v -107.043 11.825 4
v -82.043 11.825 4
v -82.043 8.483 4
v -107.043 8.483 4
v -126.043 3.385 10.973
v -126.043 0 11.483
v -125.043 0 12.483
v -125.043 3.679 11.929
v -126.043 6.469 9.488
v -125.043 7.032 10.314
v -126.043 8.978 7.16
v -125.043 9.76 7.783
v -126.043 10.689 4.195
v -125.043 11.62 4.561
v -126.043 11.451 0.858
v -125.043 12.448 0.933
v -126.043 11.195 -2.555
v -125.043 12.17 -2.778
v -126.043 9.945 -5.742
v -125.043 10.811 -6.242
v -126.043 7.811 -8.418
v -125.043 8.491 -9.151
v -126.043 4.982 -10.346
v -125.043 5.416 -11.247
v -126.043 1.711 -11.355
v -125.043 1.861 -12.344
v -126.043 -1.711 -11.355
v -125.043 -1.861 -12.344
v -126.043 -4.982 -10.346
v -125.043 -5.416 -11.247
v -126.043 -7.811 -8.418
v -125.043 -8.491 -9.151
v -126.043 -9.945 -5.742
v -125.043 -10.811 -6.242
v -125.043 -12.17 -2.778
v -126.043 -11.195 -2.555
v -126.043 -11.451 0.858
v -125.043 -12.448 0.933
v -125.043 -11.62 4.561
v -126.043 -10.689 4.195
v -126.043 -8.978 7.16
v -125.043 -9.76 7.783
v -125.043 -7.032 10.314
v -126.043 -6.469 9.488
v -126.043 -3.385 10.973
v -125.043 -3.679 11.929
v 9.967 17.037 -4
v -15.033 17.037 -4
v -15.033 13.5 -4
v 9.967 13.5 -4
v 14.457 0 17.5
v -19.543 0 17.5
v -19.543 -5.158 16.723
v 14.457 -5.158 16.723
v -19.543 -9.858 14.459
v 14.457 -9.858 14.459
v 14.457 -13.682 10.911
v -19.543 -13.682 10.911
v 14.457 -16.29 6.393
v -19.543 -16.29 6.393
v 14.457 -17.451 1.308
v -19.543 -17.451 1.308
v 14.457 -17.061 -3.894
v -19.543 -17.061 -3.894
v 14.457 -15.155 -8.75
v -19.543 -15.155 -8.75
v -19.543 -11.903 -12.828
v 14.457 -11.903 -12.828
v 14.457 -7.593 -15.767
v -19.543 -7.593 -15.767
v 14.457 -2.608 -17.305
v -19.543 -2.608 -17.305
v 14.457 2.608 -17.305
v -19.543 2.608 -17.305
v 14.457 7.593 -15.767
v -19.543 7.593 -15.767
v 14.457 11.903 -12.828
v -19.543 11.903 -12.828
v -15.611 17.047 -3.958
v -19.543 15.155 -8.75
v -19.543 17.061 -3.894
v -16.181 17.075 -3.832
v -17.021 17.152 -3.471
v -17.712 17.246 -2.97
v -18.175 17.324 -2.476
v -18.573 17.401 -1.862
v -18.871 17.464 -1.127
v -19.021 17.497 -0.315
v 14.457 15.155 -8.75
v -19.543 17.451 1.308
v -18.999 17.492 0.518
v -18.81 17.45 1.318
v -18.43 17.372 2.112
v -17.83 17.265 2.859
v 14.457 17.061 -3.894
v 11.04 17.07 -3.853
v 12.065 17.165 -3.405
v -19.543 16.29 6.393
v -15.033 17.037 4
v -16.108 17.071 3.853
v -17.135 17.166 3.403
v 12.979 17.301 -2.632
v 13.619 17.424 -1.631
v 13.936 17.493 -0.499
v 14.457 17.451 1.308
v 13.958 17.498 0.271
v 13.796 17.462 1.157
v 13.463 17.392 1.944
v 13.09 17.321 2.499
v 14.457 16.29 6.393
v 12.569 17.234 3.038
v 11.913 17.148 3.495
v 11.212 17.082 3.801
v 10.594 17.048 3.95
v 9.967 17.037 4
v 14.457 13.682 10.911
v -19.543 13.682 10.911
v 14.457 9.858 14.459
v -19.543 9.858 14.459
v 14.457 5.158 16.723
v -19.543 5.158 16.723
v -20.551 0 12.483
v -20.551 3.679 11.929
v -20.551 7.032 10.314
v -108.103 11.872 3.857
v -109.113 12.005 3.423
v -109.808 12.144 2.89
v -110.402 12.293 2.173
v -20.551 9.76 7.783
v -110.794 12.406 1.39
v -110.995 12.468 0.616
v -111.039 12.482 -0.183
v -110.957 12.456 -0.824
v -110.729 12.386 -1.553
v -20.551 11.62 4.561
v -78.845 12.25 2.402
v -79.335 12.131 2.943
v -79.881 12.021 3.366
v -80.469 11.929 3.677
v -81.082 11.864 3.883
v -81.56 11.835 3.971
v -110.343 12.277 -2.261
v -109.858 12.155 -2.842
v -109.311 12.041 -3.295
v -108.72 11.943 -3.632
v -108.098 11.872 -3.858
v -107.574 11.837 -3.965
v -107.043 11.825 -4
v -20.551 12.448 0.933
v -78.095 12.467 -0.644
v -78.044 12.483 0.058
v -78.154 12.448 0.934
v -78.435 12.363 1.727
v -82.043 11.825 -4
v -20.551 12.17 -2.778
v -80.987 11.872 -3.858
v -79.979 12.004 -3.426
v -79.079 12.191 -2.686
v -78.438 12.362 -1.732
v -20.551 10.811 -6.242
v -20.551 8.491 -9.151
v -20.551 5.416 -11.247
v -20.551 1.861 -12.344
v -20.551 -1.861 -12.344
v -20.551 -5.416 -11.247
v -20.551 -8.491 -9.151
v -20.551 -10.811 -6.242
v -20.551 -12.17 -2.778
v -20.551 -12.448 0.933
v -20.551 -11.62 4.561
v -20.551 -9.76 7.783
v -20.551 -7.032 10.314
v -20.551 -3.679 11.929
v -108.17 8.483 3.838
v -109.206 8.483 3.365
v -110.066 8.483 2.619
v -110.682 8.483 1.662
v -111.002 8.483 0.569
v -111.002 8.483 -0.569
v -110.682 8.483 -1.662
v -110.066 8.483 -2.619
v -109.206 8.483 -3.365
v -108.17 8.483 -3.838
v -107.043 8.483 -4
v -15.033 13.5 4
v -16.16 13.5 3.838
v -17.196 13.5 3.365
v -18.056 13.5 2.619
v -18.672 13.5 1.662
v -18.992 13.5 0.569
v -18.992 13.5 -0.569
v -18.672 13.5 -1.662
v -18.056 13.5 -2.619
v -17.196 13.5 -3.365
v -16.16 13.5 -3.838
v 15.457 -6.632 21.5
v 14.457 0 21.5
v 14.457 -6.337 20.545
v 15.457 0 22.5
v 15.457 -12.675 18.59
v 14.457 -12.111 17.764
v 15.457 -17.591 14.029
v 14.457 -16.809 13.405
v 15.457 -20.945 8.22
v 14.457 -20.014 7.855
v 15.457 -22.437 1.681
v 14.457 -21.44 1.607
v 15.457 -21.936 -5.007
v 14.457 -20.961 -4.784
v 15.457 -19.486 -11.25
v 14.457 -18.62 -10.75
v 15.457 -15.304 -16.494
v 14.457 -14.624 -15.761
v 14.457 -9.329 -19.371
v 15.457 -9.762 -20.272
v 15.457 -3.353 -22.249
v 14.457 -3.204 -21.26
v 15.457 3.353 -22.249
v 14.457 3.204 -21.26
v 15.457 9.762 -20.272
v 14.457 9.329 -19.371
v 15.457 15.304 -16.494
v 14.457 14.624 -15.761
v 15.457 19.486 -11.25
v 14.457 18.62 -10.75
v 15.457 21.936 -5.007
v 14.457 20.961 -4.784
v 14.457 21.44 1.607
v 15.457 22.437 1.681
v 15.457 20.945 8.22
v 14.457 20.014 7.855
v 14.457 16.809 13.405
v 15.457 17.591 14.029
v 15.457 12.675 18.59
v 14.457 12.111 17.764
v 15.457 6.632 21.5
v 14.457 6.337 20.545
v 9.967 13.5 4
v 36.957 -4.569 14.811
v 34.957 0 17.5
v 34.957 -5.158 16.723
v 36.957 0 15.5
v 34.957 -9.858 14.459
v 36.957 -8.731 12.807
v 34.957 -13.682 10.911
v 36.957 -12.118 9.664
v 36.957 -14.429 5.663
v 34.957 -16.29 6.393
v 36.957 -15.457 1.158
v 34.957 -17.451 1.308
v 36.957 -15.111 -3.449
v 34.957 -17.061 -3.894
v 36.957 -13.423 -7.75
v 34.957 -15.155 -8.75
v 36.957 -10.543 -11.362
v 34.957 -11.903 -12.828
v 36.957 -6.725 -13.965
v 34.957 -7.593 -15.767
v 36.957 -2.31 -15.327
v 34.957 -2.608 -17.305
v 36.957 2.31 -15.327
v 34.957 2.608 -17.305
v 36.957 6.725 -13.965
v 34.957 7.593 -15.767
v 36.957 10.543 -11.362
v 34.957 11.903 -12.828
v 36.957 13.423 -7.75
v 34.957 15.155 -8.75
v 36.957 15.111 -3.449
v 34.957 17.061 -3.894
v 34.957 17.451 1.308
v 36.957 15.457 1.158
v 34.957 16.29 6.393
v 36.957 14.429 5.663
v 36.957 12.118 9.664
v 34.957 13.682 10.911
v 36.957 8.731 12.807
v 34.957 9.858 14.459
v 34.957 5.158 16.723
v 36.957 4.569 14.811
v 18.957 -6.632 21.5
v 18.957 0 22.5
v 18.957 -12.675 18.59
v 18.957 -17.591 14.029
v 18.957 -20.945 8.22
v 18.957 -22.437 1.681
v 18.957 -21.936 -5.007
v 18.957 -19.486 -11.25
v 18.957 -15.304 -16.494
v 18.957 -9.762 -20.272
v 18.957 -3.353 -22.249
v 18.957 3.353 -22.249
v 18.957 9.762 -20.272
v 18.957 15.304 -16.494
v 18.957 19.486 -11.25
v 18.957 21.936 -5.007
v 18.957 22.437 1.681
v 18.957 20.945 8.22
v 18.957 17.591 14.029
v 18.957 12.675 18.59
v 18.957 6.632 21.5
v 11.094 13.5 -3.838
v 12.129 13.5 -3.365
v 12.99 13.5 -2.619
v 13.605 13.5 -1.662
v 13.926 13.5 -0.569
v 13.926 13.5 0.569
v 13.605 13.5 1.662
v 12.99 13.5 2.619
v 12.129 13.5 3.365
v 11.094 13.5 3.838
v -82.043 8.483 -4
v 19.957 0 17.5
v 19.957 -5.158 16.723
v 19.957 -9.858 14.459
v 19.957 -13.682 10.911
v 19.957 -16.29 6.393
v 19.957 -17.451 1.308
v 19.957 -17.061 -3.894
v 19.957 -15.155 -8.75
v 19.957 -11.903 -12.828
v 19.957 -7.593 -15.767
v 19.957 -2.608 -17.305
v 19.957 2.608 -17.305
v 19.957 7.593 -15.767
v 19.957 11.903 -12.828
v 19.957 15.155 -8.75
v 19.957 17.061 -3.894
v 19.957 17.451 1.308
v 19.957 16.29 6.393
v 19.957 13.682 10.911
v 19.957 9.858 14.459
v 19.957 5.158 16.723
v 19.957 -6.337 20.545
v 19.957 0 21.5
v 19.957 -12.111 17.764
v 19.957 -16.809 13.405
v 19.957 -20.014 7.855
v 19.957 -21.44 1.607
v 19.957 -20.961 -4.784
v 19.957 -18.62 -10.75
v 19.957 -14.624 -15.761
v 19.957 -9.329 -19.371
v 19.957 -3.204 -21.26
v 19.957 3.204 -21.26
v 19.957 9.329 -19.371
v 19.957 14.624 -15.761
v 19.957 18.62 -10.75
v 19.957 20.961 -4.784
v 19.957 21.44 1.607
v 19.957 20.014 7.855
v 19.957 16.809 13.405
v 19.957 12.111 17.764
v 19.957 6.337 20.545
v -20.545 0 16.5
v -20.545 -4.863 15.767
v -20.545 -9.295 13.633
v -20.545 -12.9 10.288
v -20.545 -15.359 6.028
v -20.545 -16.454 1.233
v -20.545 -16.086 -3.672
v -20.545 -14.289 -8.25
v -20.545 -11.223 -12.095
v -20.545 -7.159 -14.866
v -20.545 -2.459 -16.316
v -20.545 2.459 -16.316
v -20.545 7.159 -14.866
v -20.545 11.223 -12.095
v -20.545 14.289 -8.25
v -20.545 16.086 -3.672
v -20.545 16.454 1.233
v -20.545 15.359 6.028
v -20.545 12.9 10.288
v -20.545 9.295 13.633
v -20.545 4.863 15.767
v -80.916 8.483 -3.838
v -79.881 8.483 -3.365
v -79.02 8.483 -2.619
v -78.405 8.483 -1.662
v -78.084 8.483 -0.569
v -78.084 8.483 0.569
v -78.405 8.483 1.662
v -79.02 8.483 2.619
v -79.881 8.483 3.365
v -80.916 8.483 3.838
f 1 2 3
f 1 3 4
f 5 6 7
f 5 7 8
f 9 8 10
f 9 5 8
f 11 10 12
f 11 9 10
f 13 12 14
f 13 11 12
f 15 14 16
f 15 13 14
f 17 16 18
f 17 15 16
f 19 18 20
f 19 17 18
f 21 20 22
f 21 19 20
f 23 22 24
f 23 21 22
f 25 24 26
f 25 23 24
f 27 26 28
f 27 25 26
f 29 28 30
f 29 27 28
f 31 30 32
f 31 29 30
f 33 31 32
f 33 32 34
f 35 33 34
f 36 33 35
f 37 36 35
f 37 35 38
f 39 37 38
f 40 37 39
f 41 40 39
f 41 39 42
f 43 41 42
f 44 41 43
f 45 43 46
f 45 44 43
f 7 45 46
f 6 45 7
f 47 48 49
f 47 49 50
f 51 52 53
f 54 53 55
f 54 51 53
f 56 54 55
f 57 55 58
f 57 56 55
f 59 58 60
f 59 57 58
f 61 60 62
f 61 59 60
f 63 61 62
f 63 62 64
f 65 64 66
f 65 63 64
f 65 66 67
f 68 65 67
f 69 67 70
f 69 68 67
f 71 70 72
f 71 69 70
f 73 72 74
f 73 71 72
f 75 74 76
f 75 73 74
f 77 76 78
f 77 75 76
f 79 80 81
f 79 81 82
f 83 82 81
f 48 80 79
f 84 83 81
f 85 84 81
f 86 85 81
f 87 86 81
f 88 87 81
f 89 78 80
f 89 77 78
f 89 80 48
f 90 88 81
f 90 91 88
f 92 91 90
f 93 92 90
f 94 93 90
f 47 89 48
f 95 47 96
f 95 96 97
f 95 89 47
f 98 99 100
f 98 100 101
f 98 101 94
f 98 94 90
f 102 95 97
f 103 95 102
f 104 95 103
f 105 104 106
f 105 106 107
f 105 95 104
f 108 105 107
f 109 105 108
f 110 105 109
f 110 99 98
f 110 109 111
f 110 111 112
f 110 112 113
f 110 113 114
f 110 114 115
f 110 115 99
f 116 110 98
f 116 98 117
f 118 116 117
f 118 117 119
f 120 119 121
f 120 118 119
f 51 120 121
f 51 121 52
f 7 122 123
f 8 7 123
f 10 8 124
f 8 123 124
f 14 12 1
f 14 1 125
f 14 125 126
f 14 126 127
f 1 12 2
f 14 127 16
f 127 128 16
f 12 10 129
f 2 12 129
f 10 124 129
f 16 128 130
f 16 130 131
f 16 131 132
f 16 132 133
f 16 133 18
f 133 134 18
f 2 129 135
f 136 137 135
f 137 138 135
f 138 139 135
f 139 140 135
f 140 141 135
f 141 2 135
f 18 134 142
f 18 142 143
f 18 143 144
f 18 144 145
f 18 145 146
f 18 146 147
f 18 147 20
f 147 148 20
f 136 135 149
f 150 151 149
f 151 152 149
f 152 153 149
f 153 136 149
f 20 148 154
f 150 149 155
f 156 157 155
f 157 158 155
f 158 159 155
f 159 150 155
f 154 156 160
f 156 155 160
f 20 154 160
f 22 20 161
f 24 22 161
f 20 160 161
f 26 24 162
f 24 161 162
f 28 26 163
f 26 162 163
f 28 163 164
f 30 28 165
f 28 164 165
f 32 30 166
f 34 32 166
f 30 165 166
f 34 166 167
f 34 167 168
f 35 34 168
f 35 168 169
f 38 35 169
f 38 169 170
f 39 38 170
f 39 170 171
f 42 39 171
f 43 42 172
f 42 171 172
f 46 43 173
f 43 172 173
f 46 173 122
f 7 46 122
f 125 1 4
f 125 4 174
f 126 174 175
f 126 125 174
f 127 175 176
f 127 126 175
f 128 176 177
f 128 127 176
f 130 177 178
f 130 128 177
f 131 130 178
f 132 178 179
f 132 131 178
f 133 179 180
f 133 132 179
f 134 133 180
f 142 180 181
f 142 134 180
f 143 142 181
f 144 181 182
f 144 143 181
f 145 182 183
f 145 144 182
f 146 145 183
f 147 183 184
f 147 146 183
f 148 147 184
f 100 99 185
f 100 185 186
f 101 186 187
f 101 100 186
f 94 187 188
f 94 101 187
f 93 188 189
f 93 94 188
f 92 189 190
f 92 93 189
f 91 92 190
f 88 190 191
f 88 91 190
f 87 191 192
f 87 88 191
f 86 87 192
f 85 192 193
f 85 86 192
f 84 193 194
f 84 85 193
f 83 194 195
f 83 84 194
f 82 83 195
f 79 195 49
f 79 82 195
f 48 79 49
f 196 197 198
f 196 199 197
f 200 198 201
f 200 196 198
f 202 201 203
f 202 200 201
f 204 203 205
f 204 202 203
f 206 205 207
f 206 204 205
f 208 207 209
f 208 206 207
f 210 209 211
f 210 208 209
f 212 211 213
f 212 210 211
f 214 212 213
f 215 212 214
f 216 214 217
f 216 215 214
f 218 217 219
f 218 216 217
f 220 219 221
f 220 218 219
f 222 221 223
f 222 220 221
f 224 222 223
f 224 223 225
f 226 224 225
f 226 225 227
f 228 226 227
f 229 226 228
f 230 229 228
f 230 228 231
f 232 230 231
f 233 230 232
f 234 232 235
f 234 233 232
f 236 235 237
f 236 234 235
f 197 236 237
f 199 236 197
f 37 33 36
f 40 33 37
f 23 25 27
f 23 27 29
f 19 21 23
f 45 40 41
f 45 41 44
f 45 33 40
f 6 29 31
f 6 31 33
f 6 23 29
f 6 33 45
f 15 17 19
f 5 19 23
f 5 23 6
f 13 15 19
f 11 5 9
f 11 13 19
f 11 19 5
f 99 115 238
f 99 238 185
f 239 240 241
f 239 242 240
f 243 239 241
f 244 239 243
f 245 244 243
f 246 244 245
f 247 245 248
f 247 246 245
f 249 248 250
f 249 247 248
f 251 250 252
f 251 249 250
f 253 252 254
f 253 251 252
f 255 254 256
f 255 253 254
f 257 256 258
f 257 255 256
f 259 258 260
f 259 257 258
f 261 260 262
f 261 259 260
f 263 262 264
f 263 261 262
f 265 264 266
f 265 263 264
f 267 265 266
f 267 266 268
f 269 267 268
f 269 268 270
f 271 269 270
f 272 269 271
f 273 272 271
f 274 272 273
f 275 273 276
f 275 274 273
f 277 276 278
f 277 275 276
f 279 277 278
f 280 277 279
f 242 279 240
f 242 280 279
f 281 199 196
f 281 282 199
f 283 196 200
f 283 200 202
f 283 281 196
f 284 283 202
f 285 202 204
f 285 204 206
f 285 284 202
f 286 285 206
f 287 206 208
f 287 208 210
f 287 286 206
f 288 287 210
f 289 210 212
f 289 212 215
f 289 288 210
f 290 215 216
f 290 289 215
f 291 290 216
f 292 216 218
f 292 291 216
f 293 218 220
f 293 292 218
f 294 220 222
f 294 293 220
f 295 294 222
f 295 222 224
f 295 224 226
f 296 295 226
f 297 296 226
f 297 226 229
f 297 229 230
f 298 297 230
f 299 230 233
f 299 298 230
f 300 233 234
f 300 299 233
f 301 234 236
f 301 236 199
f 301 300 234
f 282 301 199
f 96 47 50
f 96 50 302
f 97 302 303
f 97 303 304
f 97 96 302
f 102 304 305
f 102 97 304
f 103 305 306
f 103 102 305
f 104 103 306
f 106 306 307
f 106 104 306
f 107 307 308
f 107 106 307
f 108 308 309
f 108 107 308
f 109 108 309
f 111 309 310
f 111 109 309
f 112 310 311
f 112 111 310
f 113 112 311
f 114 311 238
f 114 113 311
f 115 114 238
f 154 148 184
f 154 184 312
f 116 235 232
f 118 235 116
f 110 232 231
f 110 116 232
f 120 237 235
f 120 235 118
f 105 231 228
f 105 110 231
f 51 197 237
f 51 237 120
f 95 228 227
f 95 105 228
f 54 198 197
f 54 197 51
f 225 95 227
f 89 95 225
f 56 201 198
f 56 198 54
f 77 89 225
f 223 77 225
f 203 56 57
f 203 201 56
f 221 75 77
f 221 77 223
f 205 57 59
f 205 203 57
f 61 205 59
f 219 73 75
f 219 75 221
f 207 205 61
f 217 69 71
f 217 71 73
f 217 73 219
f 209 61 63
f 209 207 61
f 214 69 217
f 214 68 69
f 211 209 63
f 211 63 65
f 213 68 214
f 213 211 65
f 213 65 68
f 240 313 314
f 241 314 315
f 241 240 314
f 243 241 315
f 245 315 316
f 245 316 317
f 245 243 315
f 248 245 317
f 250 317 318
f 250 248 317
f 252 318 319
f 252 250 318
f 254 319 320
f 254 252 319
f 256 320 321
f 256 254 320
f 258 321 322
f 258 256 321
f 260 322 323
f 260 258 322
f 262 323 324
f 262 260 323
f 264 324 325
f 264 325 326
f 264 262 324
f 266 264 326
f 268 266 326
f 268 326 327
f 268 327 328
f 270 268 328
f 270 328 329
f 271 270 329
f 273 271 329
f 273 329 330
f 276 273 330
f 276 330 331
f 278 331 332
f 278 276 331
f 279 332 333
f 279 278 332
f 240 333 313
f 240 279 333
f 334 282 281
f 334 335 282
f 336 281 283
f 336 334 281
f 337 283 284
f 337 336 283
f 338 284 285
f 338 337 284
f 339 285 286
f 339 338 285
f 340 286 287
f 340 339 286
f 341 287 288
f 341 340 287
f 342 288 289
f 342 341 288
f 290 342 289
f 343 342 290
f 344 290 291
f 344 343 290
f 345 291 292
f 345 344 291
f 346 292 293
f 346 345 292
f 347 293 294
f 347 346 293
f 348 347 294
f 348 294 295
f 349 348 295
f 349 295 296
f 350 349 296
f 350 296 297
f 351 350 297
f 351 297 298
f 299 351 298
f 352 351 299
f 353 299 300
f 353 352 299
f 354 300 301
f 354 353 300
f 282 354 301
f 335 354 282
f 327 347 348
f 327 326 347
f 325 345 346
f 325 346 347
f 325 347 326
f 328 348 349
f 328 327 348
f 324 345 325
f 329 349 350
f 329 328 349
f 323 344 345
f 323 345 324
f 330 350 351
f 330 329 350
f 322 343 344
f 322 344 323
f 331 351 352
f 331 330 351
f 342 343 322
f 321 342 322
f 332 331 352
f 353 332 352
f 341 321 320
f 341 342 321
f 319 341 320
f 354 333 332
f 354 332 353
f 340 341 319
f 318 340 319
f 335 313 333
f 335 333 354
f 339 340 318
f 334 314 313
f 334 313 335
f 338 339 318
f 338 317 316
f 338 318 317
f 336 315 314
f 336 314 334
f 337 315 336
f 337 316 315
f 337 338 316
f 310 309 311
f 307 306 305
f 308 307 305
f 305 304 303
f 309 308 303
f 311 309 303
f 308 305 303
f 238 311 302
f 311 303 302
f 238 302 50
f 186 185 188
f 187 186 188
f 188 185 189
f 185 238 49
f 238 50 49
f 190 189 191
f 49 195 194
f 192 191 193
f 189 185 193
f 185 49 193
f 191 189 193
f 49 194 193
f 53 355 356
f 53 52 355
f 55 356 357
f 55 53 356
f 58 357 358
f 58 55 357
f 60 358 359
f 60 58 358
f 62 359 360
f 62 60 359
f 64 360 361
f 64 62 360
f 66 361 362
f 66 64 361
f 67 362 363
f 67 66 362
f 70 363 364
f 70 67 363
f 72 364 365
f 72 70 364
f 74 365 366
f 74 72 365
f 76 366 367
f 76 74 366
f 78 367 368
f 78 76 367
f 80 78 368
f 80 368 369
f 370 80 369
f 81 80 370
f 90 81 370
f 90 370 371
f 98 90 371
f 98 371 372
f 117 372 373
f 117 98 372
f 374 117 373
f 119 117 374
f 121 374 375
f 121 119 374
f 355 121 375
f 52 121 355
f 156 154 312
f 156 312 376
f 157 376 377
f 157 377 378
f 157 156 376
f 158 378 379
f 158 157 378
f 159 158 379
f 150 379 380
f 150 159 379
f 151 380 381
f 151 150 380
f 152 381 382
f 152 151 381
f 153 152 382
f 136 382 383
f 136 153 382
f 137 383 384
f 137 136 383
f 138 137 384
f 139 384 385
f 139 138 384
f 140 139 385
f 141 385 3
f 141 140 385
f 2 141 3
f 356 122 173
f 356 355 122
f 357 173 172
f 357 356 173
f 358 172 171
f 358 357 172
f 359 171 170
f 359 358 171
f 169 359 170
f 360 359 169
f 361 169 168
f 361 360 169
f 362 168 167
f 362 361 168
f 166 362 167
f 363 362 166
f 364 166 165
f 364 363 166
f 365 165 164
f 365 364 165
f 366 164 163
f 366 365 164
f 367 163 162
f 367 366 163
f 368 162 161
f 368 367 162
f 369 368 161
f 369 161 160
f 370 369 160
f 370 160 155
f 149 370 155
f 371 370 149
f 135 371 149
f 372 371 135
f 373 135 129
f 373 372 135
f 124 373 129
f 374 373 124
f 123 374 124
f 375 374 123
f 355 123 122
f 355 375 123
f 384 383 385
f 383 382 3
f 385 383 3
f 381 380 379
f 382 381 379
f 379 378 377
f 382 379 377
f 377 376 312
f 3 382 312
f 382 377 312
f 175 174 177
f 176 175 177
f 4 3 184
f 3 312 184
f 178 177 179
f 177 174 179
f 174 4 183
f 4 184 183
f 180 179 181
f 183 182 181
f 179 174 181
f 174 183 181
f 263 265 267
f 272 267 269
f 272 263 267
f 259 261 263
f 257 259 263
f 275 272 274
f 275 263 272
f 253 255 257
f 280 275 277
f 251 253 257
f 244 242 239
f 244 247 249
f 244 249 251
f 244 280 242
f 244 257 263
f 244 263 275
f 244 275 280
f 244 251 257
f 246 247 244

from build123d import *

# Parameters (mm, degrees)
CUT_EXTRUDE1_DEPTH  = 4
SKETCH3_R           = 12.483239851
BOSS_EXTRUDE1_DEPTH = 63
CUT_EXTRUDE2_DEPTH  = 4
CHAMFER1_SIZE       = 1


with BuildPart() as part:
    # Sketch1 → Revolve1 (revolve)
    with BuildSketch(Plane.XY, mode=Mode.PRIVATE) as revolve1_sk:
        Polygon((-63.043142844, 0), (-63.043142844, 12.483239851), (-20.551205143, 12.483239851), (-20.544749915, 16.500001291), (-19.543142844, 17.5), (14.456857156, 17.5), (14.456857156, 21.5), (15.456857156, 22.5), (18.956857156, 22.5), (19.956857156, 21.5), (19.956857156, 17.5), (34.956857156, 17.5), (36.956857156, 15.5), (36.956857156, 0), align=None)
    revolve(revolve1_sk.sketch.rotate(Axis((-79.289099526, 0, 0), (1, 0, 0)), 90), axis=Axis((-79.289099526, 0, 0), (1, 0, 0)))

    # Sketch2 → Cut-Extrude1 (cut)
    with BuildSketch(Plane(origin=(0, 17.5, 0), x_dir=(1, 0, 0), z_dir=(0, 1, 0))):
        with BuildLine():
            Line((-15.033175355, 4), (9.966824645, 4))
            ThreePointArc((9.966824645, 4), (13.966824645, 0), (9.966824645, -4))
            Line((9.966824645, -4), (-15.033175355, -4))
            ThreePointArc((-15.033175355, -4), (-19.033175355, 0), (-15.033175355, 4))
        make_face()
    extrude(amount=-CUT_EXTRUDE1_DEPTH, mode=Mode.SUBTRACT)

    # Sketch3 → Boss-Extrude1 (add)
    with BuildSketch(Plane.ZY.offset(63.043142844)):
        Circle(SKETCH3_R)
    extrude(amount=BOSS_EXTRUDE1_DEPTH)

    # Sketch4 → Cut-Extrude2 (cut)
    with BuildSketch(Plane(origin=(0, 12.483239851, 0), x_dir=(1, 0, 0), z_dir=(0, 1, 0))):
        with BuildLine():
            Line((-107.043142844, 4), (-82.043142844, 4))
            ThreePointArc((-82.043142844, 4), (-78.043142844, 0), (-82.043142844, -4))
            Line((-82.043142844, -4), (-107.043142844, -4))
            ThreePointArc((-107.043142844, -4), (-111.043142844, 0), (-107.043142844, 4))
        make_face()
    extrude(amount=-CUT_EXTRUDE2_DEPTH, mode=Mode.SUBTRACT)

    # Chamfer1
    chamfer1_edges = [part.edges().sort_by_distance(p)[0] for p in [
        (-126.043142844, 0, -12.483239851),
    ]]
    chamfer(chamfer1_edges, length=CHAMFER1_SIZE)


solid = part.part
